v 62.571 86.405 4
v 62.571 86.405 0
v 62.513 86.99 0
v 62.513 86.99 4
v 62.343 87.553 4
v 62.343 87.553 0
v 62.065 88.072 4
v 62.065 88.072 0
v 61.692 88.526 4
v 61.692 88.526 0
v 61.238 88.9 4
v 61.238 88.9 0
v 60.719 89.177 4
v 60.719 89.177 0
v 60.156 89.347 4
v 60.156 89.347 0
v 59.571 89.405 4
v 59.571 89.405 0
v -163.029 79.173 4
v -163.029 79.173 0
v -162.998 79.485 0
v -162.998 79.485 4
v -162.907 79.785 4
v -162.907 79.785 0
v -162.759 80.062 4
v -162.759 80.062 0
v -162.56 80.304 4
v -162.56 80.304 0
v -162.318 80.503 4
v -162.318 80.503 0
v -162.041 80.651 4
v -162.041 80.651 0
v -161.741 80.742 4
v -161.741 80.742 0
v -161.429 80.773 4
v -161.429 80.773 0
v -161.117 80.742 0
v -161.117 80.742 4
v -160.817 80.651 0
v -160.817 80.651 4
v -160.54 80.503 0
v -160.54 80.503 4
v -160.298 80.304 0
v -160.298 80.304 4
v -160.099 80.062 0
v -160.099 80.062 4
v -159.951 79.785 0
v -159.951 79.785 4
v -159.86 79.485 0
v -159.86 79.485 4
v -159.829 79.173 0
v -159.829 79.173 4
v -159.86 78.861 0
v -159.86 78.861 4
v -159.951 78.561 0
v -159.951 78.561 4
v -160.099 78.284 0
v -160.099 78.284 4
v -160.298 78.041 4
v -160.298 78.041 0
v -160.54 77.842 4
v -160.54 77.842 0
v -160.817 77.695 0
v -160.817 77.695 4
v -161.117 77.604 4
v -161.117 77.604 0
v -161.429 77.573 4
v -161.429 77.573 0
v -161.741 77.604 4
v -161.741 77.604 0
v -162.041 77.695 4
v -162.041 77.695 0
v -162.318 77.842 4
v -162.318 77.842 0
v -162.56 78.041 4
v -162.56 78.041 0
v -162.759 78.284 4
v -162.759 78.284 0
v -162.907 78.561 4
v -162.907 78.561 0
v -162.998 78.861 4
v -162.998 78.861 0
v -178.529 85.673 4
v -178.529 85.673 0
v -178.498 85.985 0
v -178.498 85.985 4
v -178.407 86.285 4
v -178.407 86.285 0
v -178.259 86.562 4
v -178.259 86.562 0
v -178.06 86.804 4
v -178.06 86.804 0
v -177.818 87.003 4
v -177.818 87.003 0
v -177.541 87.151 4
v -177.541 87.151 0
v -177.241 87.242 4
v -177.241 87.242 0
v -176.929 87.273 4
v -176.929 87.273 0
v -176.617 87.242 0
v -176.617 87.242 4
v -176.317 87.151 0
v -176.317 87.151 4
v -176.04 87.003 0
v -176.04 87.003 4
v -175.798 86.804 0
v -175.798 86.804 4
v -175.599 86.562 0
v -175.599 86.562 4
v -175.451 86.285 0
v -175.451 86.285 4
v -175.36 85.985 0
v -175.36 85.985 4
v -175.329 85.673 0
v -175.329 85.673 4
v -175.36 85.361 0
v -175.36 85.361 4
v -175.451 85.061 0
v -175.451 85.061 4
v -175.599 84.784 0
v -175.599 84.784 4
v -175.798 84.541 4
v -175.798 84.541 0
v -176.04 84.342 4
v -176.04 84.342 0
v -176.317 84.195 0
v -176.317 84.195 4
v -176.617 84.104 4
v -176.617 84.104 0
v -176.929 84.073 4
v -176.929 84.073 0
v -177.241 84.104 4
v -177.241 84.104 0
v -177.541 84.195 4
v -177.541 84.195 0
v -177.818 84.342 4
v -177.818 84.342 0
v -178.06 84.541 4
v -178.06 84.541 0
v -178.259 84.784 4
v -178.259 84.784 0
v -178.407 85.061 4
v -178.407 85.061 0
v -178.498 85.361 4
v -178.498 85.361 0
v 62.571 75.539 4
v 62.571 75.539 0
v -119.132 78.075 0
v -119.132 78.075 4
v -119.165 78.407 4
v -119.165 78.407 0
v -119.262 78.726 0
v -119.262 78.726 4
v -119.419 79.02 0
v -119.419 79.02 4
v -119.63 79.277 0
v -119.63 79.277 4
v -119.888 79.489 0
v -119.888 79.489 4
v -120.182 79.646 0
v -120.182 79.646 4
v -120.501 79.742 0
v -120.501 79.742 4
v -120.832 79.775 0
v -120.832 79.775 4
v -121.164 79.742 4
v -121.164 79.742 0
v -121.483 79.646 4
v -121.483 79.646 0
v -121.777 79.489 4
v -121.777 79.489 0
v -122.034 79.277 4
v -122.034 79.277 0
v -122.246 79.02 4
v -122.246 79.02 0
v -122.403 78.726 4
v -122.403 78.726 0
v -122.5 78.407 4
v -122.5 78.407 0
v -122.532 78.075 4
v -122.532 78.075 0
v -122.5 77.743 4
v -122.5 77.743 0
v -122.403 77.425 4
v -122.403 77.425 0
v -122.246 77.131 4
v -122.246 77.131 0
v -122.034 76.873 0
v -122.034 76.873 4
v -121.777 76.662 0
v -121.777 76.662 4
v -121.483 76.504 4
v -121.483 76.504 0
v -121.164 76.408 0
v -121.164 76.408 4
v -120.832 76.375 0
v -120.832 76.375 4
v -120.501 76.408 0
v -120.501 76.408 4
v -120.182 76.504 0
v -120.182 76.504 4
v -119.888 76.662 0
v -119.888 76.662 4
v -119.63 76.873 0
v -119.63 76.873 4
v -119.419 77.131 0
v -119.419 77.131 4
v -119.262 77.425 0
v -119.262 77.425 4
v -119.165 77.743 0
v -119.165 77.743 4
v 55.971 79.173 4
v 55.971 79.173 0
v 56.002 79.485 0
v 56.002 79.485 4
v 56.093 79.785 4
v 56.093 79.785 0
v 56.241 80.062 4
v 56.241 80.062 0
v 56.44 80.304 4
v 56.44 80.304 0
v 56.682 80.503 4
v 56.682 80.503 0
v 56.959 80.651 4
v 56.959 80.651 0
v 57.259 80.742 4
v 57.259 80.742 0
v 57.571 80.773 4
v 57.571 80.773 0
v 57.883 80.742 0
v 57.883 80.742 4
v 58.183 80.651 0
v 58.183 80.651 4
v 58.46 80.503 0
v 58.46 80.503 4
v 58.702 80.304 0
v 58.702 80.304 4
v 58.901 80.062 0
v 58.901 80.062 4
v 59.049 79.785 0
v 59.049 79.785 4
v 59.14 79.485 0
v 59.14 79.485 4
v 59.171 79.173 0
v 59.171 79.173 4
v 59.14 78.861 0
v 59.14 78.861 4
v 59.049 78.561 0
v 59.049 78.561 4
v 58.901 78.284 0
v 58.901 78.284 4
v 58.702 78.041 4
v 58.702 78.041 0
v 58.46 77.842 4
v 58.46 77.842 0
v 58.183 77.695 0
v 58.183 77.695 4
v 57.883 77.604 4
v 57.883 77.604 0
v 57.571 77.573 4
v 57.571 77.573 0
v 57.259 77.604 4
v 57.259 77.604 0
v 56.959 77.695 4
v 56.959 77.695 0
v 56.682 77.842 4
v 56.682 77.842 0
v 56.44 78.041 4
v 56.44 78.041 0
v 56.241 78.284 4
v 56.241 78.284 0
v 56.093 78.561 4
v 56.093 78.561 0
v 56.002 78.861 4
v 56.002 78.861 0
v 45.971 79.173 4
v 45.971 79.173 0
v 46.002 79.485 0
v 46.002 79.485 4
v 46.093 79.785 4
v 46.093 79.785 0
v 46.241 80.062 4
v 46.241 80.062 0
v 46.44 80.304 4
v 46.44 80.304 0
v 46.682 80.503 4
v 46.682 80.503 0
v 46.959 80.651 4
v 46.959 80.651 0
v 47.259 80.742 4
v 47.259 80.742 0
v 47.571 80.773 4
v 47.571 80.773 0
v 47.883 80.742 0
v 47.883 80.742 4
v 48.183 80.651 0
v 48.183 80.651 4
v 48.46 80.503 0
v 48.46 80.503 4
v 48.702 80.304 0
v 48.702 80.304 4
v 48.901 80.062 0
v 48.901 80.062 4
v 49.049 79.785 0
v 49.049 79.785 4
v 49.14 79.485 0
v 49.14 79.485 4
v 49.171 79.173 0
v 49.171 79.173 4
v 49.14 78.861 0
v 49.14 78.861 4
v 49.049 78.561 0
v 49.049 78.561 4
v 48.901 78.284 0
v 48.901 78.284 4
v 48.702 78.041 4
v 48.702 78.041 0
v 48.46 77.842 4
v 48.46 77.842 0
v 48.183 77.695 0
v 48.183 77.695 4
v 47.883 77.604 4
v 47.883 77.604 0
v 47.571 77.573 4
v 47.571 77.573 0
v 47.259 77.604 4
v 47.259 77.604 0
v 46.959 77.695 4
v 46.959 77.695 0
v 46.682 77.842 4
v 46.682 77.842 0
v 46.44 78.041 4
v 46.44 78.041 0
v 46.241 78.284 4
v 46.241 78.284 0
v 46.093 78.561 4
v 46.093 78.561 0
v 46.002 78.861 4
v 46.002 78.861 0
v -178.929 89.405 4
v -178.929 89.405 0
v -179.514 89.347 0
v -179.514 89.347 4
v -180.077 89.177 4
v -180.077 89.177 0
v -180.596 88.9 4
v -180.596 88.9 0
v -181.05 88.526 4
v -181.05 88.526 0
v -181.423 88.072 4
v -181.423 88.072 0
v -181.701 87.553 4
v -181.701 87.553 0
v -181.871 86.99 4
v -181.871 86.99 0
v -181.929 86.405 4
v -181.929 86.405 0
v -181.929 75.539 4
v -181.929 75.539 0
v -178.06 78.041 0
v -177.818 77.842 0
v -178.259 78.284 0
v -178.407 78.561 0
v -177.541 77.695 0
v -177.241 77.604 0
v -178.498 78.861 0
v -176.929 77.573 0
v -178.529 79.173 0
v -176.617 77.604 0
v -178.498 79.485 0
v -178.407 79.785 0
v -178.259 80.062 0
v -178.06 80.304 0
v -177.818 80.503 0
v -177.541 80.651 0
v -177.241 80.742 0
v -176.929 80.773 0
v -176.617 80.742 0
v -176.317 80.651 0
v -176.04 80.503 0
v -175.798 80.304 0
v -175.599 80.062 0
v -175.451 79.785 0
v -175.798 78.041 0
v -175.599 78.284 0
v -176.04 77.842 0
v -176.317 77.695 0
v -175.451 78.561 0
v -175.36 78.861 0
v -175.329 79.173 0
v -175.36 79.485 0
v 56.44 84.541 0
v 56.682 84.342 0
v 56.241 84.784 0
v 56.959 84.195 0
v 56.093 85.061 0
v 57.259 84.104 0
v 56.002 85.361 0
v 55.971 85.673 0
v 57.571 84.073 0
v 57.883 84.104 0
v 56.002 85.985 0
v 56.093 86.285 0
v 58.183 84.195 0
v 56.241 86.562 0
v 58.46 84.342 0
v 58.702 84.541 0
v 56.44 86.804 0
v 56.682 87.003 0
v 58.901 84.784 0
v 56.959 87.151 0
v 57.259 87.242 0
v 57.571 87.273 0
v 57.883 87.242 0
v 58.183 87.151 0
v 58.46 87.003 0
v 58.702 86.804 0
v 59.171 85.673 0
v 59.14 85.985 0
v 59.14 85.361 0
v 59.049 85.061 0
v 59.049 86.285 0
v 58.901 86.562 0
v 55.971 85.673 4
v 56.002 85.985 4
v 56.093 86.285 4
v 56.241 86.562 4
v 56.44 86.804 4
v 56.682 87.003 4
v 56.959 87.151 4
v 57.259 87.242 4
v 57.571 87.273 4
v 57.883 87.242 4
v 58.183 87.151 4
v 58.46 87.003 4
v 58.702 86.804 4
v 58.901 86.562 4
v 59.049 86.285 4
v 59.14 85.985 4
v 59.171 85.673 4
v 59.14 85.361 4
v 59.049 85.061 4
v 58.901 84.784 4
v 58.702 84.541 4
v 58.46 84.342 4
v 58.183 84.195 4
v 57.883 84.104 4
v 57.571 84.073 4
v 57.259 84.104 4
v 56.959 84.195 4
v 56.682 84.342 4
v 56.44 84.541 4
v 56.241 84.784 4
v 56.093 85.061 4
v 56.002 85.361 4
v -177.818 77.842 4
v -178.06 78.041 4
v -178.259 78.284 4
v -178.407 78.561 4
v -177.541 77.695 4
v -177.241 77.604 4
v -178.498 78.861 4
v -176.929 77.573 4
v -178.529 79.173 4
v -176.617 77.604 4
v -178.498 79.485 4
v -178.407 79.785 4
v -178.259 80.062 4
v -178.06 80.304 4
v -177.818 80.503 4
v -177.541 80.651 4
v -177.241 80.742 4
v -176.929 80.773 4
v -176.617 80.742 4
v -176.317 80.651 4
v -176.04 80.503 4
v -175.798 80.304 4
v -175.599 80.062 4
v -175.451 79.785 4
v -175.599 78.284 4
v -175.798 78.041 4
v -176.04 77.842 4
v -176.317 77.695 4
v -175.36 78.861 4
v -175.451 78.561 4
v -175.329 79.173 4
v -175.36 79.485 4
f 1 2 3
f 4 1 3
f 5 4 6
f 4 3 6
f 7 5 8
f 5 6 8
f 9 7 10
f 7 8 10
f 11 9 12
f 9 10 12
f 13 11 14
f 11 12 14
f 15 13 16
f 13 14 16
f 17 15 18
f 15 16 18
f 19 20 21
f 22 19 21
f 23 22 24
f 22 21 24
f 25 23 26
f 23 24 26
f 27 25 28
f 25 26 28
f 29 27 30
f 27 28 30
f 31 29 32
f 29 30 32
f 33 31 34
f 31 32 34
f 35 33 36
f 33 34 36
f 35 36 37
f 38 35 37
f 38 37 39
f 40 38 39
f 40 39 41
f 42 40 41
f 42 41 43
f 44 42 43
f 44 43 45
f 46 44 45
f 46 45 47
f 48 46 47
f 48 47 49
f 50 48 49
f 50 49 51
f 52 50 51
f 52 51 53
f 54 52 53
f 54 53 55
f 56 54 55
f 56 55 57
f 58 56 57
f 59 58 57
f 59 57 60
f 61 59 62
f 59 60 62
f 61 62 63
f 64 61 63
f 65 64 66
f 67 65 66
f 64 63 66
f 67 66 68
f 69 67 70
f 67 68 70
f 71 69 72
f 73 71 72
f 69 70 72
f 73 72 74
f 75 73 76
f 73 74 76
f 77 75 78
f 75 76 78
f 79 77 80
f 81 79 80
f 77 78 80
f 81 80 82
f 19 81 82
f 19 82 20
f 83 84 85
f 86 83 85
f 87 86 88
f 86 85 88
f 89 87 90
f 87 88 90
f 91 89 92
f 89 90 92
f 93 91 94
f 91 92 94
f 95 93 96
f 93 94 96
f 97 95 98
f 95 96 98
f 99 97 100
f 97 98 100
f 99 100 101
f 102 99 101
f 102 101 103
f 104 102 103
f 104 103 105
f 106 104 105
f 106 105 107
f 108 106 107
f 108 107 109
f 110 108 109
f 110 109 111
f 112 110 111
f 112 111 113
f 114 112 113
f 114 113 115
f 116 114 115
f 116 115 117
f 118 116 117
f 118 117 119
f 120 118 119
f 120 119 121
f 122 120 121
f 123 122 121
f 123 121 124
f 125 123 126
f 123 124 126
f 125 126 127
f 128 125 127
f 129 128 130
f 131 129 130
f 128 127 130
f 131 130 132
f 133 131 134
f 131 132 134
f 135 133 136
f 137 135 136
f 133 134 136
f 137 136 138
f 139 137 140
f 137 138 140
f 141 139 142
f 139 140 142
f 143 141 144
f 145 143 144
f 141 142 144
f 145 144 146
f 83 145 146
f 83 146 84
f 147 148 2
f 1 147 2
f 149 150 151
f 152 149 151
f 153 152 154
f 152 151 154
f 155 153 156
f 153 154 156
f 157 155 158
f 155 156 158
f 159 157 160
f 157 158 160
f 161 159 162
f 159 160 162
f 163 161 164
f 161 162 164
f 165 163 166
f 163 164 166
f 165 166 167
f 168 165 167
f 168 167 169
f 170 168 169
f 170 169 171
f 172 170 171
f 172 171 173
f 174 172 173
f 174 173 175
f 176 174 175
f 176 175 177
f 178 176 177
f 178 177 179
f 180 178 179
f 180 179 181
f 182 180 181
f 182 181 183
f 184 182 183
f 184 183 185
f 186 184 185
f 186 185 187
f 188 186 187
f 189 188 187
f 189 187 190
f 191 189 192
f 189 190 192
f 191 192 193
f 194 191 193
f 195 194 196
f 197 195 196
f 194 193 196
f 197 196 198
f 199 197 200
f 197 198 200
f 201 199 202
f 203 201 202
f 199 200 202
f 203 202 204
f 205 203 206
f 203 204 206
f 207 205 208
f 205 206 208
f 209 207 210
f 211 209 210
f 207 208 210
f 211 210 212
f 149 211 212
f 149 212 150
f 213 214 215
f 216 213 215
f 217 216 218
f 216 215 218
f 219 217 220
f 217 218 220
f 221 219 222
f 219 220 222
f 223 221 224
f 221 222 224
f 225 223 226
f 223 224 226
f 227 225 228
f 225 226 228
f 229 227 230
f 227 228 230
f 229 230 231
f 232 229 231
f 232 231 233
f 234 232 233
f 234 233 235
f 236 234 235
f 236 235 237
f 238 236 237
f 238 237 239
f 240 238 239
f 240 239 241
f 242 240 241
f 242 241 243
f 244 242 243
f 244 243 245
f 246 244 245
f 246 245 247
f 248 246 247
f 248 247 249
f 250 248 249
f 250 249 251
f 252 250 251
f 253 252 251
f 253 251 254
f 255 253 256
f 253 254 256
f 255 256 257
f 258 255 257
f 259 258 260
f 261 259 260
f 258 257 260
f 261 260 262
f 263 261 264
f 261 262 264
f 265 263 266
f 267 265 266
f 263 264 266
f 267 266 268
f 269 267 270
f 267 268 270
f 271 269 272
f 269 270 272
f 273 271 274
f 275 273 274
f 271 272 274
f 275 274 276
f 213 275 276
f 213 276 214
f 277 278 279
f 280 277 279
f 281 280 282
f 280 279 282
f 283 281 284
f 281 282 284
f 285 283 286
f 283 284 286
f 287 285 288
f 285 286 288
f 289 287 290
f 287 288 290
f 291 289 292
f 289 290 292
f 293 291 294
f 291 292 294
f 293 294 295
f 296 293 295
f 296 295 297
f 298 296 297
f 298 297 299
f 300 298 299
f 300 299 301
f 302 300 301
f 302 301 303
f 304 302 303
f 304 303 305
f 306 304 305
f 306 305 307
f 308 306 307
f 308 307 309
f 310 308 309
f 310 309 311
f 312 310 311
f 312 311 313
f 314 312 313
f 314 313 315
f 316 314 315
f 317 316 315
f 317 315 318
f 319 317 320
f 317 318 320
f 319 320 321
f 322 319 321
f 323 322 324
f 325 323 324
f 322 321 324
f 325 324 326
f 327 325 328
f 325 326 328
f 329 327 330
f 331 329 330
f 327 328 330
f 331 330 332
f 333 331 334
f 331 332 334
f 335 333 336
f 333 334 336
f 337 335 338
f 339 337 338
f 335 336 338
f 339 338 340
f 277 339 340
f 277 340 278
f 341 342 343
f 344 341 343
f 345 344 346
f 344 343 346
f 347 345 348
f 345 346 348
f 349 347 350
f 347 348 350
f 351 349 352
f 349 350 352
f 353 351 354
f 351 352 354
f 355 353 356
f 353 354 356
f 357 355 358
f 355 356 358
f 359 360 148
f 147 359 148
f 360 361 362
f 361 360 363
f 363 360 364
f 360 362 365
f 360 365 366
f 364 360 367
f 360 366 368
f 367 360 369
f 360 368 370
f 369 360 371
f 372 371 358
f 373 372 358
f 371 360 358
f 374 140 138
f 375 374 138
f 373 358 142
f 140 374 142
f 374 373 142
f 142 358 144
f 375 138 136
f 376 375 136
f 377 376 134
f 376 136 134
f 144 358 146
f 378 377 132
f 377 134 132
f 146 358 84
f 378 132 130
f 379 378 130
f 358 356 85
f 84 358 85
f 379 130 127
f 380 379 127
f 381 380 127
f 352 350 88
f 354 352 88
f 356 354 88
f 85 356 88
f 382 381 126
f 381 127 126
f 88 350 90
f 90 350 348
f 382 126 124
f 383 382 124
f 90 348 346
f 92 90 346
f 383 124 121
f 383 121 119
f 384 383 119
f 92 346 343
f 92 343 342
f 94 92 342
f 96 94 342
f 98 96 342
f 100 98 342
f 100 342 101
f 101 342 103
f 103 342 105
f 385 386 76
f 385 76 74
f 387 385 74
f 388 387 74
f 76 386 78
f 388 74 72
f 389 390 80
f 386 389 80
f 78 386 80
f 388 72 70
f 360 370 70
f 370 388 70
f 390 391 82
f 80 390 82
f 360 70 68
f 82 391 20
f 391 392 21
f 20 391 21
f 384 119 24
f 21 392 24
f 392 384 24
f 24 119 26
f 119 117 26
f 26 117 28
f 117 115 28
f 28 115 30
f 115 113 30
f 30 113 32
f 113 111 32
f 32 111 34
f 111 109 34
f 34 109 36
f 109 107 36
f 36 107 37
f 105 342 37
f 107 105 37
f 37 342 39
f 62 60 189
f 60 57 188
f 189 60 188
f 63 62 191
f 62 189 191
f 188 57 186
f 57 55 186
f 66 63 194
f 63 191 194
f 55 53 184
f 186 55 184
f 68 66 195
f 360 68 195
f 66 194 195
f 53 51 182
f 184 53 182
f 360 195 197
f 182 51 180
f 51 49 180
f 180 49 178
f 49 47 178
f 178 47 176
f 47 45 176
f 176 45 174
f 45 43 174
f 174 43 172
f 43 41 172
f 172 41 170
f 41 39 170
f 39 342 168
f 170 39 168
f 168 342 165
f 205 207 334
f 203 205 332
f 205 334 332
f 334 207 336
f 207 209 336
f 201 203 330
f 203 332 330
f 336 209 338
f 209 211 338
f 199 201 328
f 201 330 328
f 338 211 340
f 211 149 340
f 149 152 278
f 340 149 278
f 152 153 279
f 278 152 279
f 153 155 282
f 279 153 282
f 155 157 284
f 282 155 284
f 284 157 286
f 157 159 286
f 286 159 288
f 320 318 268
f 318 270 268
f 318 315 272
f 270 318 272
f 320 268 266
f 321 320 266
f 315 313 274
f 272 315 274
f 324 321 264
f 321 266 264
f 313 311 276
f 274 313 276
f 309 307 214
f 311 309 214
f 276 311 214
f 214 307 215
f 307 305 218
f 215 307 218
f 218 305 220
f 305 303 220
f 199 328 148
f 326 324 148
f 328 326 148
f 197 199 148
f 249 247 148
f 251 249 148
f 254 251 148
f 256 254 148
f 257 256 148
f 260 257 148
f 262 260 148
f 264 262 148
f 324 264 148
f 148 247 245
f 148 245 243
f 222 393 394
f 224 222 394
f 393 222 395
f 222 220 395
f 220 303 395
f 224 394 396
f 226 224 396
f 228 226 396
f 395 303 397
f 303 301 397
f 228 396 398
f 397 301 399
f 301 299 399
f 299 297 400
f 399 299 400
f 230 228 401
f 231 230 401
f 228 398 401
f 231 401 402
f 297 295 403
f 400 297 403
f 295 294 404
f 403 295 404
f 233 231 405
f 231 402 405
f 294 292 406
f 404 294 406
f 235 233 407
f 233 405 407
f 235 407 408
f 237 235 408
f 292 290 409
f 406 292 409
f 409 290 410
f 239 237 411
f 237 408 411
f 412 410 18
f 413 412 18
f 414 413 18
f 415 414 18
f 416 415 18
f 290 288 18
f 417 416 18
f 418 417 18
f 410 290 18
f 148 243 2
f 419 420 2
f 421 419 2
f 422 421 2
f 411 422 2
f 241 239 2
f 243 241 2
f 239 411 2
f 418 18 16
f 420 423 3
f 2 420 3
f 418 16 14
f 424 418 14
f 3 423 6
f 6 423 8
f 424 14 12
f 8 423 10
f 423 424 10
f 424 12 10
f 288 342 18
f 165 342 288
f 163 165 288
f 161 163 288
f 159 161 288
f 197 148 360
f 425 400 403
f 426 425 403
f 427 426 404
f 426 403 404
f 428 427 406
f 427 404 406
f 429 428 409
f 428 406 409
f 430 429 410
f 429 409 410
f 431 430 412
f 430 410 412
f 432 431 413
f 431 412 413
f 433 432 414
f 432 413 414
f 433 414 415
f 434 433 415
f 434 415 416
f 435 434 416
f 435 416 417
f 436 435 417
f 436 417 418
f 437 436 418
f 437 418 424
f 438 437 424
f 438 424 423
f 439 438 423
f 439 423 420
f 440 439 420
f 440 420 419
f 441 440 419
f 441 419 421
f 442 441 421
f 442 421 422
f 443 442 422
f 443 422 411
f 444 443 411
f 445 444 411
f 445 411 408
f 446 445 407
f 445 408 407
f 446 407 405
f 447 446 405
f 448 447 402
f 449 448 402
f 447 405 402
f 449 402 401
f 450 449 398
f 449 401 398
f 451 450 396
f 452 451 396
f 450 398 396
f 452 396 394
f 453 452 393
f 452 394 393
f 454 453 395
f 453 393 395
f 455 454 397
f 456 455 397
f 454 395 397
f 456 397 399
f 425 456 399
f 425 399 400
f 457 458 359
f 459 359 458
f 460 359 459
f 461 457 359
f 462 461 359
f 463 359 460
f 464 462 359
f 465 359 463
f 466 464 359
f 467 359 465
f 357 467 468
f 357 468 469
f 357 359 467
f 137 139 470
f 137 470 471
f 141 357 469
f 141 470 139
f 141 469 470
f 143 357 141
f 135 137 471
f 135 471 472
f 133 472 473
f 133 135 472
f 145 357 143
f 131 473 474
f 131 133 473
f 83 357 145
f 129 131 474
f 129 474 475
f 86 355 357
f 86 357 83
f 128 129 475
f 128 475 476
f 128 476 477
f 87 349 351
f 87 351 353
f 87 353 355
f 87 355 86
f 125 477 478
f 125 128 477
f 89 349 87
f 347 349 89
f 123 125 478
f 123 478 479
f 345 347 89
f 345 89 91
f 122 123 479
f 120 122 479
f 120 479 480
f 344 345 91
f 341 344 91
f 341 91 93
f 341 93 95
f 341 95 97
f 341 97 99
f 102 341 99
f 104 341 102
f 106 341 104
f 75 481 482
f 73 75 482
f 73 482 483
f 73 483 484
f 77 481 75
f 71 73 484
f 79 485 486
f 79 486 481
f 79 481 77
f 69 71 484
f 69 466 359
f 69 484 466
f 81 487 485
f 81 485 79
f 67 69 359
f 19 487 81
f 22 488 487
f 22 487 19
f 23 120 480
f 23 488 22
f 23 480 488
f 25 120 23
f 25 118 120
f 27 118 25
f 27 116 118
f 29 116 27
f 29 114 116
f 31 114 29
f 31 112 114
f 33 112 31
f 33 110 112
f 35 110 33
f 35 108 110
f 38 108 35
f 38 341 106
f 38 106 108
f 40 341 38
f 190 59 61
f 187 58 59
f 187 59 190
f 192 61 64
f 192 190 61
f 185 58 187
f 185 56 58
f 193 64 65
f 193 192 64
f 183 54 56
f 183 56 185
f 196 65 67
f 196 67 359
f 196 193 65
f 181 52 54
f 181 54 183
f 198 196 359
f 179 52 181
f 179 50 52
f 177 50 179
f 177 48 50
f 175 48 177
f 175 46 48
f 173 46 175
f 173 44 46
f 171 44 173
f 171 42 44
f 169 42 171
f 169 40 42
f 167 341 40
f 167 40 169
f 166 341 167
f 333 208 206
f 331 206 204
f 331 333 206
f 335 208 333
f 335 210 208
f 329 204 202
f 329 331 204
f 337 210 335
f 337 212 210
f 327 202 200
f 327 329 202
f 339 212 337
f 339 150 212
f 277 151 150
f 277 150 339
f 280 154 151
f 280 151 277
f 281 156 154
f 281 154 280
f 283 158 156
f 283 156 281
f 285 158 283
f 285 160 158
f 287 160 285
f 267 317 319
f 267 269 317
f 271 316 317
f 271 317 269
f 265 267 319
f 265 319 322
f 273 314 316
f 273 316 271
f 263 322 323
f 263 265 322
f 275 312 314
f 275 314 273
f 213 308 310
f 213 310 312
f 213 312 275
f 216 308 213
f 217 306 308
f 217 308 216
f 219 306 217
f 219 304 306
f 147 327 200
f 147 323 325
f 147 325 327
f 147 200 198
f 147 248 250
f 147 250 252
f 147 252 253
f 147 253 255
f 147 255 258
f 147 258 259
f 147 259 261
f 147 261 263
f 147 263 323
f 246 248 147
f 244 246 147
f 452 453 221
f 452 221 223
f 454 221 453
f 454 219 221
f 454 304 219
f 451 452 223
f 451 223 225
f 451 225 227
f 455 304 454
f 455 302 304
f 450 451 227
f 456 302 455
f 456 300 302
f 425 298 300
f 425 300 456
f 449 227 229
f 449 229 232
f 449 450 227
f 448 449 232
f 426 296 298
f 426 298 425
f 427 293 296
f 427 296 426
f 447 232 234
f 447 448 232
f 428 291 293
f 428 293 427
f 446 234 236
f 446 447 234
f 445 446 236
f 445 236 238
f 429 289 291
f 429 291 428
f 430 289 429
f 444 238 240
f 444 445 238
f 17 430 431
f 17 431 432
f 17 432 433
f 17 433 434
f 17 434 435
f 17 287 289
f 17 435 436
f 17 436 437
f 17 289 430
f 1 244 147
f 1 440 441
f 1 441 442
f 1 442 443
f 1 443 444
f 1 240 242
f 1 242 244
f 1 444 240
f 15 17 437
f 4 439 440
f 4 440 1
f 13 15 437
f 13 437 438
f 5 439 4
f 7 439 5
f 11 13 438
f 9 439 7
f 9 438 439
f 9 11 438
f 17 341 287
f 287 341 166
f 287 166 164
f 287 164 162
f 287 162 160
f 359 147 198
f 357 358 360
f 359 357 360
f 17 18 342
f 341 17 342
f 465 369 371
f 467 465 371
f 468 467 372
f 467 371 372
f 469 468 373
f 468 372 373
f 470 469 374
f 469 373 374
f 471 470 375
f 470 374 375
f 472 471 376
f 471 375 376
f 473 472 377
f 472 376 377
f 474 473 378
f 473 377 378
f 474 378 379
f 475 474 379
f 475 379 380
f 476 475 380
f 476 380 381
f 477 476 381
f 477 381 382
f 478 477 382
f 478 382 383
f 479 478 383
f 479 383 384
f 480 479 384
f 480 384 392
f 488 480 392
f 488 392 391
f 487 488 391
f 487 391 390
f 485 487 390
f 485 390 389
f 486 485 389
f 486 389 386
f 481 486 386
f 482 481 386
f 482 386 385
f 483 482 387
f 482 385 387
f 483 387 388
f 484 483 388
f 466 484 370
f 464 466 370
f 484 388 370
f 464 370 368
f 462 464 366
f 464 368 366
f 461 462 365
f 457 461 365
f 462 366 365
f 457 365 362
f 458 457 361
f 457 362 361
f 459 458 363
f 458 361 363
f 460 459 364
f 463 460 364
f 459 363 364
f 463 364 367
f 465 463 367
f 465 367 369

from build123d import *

# Parameters (mm, degrees)
BOSS_EXTRUDE1_DEPTH  = 4
M3_CLEARANCE_HOLE1_D = 3.2
M3_CLEARANCE_HOLE2_D = 3.4


with BuildPart() as part:
    # Sketch1 → Boss-Extrude1 (new body)
    with BuildSketch(Plane.XY):
        with BuildLine():
            Line((59.571068699, 89.405091171), (-178.928931301, 89.405091171))
            ThreePointArc((-178.928931301, 89.405091171), (-181.050251645, 88.526411514), (-181.928931301, 86.405091171))
            Line((-181.928931301, 86.405091171), (-181.928931301, 75.539261619))
            Line((-181.928931301, 75.539261619), (62.571068699, 75.539261619))
            Line((62.571068699, 75.539261619), (62.571068699, 86.405091171))
            ThreePointArc((62.571068699, 86.405091171), (61.692389042, 88.526411514), (59.571068699, 89.405091171))
        make_face()
    extrude(amount=BOSS_EXTRUDE1_DEPTH)

    # M3 Clearance Hole1 (through all)
    with Locations(Plane.XY.offset(4)):
        with Locations((-176.928931301, 85.672841171), (-176.928931301, 79.172841171), (-161.428931301, 79.172841171), (47.571068699, 79.172841171), (57.571068699, 79.172841171), (57.571068699, 85.672841171)):
            Hole(M3_CLEARANCE_HOLE1_D / 2)

    # M3 Clearance Hole2 (through all)
    with Locations(Plane(origin=(0, 0, 0), x_dir=(-1, 0, 0), z_dir=(0, 0, -1))):
        with Locations((120.8322952, 78.075091171)):
            Hole(M3_CLEARANCE_HOLE2_D / 2)


solid = part.part
